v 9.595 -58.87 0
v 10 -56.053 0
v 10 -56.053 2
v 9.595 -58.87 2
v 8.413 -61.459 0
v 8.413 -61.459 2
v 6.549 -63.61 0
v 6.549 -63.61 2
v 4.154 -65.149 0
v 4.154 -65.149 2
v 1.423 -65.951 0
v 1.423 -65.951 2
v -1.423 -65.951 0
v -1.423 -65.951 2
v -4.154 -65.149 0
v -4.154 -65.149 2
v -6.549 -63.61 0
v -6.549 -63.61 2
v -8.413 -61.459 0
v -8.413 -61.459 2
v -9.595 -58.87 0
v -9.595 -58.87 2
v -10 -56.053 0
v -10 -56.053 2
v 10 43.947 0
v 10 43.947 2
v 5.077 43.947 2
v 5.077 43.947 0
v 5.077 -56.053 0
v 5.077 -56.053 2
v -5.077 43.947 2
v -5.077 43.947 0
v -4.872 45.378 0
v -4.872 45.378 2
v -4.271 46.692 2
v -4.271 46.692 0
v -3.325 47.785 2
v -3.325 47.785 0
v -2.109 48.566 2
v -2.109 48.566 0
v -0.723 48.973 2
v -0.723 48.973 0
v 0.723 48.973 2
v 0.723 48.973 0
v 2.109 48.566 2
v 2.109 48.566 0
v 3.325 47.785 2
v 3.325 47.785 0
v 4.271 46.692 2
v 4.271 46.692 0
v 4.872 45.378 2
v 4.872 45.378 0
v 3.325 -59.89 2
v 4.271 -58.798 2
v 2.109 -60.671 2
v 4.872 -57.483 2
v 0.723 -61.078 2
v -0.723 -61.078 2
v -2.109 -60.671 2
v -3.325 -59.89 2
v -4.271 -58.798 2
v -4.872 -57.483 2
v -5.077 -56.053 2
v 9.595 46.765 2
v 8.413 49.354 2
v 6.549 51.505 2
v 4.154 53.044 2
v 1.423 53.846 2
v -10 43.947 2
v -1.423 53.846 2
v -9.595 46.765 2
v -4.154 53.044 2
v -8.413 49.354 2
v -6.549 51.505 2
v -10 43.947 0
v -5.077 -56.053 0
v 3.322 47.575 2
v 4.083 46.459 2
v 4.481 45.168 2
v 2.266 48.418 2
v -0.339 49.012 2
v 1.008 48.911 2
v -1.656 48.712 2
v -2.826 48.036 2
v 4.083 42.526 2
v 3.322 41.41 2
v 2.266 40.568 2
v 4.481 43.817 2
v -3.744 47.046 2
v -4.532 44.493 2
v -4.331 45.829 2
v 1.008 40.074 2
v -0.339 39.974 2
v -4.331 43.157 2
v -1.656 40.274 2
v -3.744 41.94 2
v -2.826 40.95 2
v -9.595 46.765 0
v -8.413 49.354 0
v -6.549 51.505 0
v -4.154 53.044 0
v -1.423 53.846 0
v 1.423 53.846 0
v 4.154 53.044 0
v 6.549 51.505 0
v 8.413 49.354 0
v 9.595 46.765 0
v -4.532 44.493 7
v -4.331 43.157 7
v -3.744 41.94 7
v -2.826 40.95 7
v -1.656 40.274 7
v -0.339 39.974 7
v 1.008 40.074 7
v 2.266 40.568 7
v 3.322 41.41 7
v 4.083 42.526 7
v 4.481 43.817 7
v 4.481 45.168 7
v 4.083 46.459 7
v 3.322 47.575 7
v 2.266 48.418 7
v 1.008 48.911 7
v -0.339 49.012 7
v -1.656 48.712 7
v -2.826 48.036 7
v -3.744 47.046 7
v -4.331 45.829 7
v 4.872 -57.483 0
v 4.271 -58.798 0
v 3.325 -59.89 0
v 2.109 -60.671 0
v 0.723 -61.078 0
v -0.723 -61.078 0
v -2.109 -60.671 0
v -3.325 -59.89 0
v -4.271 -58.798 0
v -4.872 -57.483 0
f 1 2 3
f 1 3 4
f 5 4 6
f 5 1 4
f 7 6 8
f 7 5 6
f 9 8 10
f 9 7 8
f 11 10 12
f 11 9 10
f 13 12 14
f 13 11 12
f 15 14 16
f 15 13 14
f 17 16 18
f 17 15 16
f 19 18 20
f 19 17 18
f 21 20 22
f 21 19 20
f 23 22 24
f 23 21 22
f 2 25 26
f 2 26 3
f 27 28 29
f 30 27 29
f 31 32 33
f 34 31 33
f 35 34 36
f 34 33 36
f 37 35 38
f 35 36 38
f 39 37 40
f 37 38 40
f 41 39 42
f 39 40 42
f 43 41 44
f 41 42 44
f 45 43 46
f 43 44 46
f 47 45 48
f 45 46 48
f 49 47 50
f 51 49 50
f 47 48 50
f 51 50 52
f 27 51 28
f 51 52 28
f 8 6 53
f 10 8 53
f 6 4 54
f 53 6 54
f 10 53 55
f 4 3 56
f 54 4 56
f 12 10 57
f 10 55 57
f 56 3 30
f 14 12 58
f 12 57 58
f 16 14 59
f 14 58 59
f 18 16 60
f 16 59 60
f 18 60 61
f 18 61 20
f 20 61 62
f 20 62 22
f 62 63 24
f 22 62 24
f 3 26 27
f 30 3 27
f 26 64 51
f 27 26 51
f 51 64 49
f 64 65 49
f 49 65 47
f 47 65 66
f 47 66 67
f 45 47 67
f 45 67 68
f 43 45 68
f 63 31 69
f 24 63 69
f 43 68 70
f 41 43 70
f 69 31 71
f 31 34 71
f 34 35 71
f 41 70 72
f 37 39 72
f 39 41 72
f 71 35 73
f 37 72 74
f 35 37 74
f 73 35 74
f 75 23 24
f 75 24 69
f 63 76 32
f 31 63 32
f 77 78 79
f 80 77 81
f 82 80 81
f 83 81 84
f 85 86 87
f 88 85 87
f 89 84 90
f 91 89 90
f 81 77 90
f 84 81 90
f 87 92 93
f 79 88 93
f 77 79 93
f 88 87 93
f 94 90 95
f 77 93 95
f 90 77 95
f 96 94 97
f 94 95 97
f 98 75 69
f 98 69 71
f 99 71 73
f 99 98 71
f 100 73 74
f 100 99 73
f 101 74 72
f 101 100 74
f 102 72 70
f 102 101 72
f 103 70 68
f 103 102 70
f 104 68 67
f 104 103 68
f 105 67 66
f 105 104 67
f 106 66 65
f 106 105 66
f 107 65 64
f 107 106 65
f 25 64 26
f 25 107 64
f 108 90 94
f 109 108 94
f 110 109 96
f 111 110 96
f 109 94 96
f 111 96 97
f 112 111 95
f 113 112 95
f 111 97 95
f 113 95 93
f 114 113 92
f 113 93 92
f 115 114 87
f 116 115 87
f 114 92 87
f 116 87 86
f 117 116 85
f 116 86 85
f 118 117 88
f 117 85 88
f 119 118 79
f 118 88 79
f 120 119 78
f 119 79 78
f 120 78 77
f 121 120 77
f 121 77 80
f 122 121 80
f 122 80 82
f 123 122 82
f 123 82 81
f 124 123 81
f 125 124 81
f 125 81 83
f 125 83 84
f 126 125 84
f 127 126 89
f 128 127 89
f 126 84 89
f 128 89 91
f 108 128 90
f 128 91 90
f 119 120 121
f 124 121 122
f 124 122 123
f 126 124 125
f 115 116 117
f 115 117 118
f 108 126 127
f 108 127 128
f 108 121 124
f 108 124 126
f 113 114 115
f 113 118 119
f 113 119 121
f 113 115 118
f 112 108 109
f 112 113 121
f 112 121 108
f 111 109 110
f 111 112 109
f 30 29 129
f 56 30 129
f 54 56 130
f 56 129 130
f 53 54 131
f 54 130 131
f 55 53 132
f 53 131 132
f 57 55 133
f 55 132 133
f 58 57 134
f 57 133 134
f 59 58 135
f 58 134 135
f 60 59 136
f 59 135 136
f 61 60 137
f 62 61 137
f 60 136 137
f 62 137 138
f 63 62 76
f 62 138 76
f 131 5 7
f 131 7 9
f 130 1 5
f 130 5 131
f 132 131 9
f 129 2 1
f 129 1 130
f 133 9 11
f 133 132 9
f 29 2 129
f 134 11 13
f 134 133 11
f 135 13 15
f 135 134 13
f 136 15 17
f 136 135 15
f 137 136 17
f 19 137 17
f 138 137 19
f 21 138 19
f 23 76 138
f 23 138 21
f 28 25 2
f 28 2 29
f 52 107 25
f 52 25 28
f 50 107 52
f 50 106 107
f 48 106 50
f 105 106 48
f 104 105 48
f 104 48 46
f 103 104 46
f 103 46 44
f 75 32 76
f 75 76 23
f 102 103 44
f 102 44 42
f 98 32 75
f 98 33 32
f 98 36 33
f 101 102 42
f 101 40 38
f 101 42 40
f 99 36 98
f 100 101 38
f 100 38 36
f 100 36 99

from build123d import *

# Parameters (mm, degrees)
BOSS_EXTRUDE1_DEPTH = 2
SKETCH2_R           = 4.531979256
BOSS_EXTRUDE2_DEPTH = 5


with BuildPart() as part:
    # Sketch1 → Boss-Extrude1 (new body)
    with BuildSketch(Plane.XY):
        with BuildLine():
            Line((-10, -56.052631579), (-10, 43.947368421))
            ThreePointArc((-10, 43.947368421), (0, 53.947368421), (10, 43.947368421))
            Line((10, 43.947368421), (10, -56.052631579))
            ThreePointArc((10, -56.052631579), (0, -66.052631579), (-10, -56.052631579))
        make_face()
        with BuildLine():
            Line((-5.077438158, -56.052631579), (-5.077438158, 43.947368421))
            ThreePointArc((-5.077438158, 43.947368421), (0, 49.024806579), (5.077438158, 43.947368421))
            Line((5.077438158, 43.947368421), (5.077438158, -56.052631579))
            ThreePointArc((5.077438158, -56.052631579), (0, -61.130069737), (-5.077438158, -56.052631579))
        make_face(mode=Mode.SUBTRACT)
    extrude(amount=BOSS_EXTRUDE1_DEPTH)


with BuildPart() as body_2:
    # Sketch2 → Boss-Extrude2 (new body)
    with BuildSketch(Plane.XY.offset(2)):
        with Locations(Location((0, 44.492827323, 0), (0, 0, 180))):
            Circle(SKETCH2_R)
    extrude(amount=BOSS_EXTRUDE2_DEPTH)


solid = Compound([part.part, body_2.part])
